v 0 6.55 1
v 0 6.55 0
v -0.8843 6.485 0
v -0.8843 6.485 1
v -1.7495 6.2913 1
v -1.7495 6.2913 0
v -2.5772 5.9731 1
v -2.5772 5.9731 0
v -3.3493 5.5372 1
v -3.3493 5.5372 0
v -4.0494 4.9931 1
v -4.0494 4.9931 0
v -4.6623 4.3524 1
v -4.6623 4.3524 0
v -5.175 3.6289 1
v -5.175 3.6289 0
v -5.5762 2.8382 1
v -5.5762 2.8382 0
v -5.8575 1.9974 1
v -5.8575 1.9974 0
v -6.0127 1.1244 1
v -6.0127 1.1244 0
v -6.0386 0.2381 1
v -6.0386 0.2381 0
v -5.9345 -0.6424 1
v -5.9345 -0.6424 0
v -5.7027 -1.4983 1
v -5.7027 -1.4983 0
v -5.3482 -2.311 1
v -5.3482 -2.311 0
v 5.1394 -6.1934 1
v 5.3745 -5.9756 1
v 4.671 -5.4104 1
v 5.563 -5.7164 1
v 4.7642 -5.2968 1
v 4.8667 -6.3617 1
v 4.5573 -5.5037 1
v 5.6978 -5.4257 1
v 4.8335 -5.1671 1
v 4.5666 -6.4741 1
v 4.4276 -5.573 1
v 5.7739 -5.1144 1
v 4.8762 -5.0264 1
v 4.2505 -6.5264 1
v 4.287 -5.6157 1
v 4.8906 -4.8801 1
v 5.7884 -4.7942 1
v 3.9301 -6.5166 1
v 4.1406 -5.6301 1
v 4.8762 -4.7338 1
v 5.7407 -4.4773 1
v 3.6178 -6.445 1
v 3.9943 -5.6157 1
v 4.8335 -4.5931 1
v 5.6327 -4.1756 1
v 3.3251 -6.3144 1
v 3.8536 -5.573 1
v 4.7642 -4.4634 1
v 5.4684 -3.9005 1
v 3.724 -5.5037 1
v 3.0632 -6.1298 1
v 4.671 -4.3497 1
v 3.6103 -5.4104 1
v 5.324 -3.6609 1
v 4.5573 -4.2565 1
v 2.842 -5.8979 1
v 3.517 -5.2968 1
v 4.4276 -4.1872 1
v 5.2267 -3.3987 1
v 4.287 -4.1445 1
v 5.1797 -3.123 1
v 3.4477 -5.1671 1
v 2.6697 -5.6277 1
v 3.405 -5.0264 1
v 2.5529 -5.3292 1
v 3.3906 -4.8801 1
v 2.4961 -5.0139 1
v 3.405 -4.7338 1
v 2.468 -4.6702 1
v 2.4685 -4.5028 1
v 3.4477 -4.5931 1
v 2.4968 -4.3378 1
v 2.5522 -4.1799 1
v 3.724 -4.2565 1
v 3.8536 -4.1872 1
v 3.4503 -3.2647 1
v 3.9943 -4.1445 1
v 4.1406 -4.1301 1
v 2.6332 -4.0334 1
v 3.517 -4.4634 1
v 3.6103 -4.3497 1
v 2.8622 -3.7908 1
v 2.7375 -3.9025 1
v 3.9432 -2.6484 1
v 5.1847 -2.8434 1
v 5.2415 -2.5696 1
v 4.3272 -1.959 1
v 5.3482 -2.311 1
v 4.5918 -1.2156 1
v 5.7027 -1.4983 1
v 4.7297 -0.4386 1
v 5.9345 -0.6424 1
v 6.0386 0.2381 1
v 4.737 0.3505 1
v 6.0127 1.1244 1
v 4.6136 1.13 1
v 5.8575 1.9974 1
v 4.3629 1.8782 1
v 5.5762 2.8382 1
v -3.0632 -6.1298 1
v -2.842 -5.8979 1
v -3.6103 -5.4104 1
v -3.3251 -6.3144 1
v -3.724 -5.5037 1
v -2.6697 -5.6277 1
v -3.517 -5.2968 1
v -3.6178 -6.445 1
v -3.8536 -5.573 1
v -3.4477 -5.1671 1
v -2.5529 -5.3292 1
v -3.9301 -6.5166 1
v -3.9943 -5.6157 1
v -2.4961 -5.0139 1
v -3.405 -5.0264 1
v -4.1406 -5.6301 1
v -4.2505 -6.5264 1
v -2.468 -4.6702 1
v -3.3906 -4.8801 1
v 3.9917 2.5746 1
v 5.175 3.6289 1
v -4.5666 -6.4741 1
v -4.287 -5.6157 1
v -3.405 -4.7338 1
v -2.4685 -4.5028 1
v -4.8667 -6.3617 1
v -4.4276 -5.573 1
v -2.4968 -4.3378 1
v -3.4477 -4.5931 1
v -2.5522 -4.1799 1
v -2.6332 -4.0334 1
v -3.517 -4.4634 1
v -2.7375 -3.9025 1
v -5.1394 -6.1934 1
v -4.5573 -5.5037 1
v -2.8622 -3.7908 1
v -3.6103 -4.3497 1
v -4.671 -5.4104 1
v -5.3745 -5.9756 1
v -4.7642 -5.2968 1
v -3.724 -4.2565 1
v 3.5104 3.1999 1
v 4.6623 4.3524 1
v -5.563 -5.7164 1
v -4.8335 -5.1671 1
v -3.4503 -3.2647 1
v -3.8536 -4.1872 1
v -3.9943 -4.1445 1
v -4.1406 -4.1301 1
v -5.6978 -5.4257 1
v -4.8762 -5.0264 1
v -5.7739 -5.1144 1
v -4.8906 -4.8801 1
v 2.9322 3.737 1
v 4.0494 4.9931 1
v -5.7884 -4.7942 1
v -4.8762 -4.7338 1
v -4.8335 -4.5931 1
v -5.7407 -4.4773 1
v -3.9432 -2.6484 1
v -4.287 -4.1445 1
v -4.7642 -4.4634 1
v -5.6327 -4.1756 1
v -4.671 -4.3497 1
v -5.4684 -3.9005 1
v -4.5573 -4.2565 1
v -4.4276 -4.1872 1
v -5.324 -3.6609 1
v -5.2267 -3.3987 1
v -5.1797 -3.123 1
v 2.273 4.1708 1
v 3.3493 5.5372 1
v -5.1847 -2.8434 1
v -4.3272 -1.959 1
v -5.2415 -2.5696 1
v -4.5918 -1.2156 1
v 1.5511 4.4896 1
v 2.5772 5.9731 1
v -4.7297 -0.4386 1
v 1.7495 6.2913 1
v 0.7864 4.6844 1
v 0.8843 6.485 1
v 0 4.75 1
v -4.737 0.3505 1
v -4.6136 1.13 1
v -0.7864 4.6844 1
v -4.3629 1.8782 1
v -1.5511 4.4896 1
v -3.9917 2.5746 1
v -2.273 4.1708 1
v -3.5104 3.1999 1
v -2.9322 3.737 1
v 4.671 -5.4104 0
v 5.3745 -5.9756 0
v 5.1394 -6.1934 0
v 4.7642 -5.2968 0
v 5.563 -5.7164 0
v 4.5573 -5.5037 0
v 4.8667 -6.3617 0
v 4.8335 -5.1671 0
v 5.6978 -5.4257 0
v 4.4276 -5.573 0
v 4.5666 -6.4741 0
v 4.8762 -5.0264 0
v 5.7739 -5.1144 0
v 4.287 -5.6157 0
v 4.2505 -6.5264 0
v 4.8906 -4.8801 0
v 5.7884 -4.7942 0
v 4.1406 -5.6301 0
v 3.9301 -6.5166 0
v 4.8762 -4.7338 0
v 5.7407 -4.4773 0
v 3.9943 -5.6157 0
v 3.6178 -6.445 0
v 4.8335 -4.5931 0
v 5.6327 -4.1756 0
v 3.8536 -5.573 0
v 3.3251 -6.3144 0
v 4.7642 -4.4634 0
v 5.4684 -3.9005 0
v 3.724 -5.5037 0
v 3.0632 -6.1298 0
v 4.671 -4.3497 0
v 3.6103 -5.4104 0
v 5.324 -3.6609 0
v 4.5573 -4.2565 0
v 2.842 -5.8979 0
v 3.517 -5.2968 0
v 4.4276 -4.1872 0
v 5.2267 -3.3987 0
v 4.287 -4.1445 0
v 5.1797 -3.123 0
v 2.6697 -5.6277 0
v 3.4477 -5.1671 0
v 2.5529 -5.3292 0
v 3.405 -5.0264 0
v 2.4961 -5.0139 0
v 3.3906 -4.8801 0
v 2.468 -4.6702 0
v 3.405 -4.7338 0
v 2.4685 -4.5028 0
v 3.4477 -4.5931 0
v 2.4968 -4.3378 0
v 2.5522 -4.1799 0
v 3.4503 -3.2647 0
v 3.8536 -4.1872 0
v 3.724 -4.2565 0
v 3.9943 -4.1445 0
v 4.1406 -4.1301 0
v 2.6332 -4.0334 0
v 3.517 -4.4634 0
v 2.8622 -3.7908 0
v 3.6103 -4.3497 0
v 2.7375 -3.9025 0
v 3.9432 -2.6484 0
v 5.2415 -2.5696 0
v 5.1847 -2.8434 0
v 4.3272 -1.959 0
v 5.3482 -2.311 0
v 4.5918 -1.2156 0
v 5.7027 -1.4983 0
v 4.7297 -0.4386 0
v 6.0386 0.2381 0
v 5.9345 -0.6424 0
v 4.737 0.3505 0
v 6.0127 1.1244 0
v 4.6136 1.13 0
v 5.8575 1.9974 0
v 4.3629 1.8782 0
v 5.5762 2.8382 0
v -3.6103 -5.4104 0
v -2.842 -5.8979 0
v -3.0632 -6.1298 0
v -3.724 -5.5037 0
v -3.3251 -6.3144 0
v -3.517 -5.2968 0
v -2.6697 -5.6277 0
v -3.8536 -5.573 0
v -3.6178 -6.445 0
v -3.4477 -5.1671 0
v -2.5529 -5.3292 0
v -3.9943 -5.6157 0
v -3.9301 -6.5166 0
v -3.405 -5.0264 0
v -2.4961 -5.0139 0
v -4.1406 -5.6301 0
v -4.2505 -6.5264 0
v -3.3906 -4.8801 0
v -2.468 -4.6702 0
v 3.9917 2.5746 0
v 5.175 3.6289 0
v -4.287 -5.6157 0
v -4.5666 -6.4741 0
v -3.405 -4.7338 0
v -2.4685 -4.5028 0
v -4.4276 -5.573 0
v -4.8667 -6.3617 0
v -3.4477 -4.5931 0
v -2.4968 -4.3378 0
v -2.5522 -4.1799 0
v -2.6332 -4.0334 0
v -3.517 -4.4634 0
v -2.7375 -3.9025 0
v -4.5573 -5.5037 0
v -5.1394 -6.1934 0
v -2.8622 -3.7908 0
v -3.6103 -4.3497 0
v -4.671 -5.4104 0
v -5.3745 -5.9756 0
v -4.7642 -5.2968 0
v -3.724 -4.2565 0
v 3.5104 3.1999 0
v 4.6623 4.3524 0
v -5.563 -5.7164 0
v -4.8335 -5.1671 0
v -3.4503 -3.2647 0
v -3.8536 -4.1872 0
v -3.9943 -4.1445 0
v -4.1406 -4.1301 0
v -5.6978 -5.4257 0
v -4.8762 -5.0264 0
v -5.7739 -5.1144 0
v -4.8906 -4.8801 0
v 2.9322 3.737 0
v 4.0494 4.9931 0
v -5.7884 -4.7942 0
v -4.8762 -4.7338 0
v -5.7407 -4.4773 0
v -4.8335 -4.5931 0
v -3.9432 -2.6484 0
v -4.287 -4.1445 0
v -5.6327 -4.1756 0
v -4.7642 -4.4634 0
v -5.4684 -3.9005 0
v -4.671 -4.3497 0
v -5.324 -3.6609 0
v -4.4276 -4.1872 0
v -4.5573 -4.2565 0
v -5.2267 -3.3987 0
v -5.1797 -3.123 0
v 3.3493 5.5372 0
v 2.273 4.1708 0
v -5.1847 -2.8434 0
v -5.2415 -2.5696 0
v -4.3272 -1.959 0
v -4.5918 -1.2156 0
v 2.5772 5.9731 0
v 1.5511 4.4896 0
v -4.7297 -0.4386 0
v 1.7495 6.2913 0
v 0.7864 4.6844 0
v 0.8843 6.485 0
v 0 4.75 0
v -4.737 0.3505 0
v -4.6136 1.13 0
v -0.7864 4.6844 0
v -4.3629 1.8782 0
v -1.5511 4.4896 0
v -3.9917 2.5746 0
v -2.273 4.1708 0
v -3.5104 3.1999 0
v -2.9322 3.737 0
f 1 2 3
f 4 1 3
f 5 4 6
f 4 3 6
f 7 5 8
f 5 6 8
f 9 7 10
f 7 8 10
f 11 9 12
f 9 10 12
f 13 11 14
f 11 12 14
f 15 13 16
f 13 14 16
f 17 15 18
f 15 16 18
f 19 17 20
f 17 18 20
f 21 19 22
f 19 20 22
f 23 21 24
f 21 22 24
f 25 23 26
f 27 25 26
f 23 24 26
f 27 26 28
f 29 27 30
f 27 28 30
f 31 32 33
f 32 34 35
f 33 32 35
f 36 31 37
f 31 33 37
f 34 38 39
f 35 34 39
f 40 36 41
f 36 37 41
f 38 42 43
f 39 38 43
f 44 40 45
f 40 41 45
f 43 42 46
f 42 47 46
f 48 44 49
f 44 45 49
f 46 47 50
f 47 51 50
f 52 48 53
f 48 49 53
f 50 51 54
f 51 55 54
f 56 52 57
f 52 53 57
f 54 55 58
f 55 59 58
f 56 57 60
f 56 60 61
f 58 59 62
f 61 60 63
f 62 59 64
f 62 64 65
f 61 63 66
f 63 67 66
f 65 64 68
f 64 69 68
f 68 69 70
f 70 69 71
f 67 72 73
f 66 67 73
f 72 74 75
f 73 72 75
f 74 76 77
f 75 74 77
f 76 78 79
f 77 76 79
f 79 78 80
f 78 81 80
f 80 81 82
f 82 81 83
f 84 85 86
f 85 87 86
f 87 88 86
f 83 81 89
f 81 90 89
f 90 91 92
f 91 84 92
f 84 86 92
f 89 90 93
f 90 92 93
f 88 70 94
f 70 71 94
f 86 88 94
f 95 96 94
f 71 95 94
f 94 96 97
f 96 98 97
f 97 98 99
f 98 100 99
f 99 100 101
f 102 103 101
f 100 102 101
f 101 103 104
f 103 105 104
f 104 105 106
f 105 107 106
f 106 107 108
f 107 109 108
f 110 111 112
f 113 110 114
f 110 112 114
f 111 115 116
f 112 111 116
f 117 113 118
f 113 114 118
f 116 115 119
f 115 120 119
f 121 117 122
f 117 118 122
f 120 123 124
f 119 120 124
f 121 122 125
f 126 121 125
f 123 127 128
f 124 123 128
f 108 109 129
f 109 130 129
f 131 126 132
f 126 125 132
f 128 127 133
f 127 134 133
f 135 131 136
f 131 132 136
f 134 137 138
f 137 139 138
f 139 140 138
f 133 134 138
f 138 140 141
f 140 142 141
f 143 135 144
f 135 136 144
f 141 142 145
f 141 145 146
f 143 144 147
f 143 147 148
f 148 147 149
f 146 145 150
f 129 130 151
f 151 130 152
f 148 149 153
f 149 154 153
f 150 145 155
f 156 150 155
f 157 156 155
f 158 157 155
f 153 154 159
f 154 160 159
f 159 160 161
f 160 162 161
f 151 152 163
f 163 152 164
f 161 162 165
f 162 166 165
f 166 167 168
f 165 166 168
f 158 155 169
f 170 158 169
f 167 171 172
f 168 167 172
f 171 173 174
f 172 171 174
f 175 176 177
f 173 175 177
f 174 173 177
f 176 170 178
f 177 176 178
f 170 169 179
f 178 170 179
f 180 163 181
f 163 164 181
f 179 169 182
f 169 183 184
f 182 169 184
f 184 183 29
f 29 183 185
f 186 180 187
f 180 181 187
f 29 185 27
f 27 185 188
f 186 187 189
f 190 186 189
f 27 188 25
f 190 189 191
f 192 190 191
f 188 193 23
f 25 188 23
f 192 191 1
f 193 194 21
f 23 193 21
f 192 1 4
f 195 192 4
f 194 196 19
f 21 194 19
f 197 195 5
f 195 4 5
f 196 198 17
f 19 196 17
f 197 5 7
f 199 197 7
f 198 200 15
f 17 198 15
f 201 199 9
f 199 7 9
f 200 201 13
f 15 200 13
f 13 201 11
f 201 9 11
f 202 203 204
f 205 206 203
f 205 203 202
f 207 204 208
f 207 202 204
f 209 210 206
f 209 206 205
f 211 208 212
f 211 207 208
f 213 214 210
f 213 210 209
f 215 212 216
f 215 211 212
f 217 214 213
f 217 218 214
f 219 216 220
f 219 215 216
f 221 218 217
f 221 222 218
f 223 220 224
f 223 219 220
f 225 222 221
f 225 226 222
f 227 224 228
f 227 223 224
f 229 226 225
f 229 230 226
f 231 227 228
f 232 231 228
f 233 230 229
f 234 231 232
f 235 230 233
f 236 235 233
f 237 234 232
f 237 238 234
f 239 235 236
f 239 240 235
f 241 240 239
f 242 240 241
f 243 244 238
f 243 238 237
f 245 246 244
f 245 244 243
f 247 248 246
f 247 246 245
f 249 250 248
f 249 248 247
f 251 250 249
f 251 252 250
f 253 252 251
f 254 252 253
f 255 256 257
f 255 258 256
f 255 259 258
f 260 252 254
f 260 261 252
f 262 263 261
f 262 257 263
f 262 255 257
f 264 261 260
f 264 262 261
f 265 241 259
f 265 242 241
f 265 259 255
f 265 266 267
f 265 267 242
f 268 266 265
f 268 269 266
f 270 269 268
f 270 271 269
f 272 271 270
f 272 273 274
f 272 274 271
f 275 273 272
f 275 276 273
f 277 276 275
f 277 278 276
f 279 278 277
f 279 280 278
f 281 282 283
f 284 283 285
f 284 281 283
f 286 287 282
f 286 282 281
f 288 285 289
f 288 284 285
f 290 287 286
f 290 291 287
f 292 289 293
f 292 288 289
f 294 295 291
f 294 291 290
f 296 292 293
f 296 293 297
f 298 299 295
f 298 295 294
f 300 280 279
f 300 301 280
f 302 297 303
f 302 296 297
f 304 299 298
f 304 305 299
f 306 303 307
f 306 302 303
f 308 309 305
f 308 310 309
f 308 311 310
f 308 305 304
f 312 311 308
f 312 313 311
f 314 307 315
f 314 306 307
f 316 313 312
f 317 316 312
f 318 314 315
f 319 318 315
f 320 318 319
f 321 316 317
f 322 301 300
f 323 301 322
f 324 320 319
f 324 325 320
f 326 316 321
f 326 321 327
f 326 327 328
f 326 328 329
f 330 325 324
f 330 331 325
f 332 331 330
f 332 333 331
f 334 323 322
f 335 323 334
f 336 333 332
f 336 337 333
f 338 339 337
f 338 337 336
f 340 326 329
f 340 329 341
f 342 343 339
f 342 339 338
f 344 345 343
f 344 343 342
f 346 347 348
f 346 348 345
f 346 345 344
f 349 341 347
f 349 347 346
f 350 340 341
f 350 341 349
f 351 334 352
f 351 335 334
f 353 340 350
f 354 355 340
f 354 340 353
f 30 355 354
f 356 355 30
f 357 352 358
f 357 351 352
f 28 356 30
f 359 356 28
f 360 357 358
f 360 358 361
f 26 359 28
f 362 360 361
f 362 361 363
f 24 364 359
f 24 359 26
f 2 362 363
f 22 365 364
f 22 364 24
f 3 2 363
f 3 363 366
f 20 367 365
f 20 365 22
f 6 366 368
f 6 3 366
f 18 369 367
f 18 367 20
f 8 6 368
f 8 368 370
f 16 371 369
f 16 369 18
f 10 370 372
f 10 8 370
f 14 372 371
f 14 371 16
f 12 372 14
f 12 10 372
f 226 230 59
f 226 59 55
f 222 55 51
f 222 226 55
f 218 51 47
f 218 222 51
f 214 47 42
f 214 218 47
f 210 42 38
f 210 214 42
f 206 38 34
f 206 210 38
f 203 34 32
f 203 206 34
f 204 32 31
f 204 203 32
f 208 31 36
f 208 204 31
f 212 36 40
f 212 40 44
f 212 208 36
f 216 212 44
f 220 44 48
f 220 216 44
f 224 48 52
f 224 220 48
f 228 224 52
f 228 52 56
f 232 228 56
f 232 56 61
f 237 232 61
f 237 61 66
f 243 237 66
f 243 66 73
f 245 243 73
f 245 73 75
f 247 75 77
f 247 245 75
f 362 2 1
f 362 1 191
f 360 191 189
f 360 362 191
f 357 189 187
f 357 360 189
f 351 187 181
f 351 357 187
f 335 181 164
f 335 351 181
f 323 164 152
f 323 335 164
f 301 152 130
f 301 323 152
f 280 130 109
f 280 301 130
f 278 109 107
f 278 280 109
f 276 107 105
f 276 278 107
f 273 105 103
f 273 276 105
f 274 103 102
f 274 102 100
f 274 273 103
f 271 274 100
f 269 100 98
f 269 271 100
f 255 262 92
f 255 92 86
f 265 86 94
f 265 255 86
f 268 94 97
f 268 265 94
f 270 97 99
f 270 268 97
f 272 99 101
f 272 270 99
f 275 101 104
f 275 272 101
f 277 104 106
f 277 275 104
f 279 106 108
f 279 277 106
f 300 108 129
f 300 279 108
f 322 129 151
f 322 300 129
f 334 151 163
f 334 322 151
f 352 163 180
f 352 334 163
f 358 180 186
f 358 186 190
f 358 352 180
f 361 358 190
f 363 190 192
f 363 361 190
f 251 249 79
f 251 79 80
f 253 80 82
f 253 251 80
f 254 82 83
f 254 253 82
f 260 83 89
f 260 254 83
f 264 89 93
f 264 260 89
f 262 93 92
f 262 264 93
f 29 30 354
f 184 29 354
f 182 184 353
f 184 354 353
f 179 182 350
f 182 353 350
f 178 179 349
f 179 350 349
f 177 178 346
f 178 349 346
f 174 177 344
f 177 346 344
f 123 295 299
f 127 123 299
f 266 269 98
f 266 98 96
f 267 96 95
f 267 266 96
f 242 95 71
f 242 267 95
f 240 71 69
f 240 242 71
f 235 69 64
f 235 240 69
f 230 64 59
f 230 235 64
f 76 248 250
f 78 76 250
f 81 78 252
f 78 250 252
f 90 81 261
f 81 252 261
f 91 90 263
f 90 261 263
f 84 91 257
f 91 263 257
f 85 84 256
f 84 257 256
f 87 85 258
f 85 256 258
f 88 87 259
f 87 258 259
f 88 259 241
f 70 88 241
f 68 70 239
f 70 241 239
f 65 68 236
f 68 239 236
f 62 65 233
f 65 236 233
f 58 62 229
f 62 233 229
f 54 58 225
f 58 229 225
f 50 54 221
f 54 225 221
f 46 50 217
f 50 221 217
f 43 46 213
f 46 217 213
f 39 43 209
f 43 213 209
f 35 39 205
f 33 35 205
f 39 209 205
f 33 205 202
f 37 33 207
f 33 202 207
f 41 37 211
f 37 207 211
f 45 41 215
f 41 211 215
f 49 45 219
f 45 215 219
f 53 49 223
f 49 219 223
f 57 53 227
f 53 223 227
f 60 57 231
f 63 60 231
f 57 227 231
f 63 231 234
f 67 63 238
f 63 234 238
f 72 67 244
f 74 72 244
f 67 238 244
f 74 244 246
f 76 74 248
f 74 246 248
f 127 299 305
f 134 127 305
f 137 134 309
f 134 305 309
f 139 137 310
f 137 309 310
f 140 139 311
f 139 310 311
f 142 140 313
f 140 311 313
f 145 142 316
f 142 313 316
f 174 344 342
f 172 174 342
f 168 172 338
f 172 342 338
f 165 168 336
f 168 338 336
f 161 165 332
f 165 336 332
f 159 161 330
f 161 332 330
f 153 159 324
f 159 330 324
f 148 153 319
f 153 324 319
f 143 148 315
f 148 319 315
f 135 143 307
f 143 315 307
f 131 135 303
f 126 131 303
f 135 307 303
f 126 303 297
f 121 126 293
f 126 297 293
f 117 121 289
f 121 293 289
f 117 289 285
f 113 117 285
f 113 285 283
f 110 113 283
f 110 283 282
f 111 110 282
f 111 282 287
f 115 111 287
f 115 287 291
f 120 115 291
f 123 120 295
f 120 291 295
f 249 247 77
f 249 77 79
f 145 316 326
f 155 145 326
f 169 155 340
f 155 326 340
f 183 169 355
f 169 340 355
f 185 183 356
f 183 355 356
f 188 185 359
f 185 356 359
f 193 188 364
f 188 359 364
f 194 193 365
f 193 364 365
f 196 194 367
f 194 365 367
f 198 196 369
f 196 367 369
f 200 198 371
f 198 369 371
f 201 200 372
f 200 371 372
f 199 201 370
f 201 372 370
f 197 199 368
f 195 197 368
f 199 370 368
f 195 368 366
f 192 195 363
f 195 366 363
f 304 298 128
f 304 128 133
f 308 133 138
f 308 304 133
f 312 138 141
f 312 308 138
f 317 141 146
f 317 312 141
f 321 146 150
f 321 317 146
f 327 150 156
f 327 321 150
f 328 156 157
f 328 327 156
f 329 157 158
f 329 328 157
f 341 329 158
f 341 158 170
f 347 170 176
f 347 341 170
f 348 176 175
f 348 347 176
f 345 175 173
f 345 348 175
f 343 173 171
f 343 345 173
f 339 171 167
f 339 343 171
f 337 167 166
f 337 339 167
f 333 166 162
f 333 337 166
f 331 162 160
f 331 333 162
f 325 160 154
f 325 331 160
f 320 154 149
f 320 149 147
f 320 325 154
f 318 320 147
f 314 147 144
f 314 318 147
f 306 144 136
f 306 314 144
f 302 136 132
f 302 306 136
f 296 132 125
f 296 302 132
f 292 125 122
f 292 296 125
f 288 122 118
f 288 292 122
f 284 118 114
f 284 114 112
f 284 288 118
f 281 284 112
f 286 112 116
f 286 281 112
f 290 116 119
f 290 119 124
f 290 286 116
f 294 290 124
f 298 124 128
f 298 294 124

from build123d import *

# Parameters (mm, degrees)
SKETCH_2_R      = 0.75
EXTRUDE_1_DEPTH = 1


with BuildPart() as part:
    # Эскиз2 → Бобышка-Вытянуть1 (new body)
    with BuildSketch(Plane.XY):
        with BuildLine():
            Line((1e-09, 4.75), (0, 6.55))
            ThreePointArc((0, 6.55), (-5.174962188, 3.628926318), (-5.348211601, -2.311013895))
            ThreePointArc((-5.348211601, -2.311013895), (-5.179687707, -3.123034993), (-5.468378103, -3.900490086))
            ThreePointArc((-5.468378103, -3.900490086), (-4.719418002, -6.425234093), (-2.496065251, -5.013860266))
            Line((-2.496065251, -5.013860266), (-2.468043041, -4.670176577))
            ThreePointArc((-2.468043041, -4.670176577), (-2.552204681, -4.179903536), (-2.862172849, -3.790839825))
            ThreePointArc((-2.862172849, -3.790839825), (-4.503831101, 1.50930627), (1e-09, 4.75))
        make_face()
        with Locations((-4.140632757, -4.880077906)):
            Circle(SKETCH_2_R, mode=Mode.SUBTRACT)
    extrude(amount=EXTRUDE_1_DEPTH)

    # Зеркальное отражение1: part across plane


with BuildPart() as part_1:
    add(part.part)
    add(part.part.mirror(Plane(origin=(1e-09, 4.75, 1), x_dir=(0, 0, 1), z_dir=(-1, 0, 0))))


solid = part_1.part
